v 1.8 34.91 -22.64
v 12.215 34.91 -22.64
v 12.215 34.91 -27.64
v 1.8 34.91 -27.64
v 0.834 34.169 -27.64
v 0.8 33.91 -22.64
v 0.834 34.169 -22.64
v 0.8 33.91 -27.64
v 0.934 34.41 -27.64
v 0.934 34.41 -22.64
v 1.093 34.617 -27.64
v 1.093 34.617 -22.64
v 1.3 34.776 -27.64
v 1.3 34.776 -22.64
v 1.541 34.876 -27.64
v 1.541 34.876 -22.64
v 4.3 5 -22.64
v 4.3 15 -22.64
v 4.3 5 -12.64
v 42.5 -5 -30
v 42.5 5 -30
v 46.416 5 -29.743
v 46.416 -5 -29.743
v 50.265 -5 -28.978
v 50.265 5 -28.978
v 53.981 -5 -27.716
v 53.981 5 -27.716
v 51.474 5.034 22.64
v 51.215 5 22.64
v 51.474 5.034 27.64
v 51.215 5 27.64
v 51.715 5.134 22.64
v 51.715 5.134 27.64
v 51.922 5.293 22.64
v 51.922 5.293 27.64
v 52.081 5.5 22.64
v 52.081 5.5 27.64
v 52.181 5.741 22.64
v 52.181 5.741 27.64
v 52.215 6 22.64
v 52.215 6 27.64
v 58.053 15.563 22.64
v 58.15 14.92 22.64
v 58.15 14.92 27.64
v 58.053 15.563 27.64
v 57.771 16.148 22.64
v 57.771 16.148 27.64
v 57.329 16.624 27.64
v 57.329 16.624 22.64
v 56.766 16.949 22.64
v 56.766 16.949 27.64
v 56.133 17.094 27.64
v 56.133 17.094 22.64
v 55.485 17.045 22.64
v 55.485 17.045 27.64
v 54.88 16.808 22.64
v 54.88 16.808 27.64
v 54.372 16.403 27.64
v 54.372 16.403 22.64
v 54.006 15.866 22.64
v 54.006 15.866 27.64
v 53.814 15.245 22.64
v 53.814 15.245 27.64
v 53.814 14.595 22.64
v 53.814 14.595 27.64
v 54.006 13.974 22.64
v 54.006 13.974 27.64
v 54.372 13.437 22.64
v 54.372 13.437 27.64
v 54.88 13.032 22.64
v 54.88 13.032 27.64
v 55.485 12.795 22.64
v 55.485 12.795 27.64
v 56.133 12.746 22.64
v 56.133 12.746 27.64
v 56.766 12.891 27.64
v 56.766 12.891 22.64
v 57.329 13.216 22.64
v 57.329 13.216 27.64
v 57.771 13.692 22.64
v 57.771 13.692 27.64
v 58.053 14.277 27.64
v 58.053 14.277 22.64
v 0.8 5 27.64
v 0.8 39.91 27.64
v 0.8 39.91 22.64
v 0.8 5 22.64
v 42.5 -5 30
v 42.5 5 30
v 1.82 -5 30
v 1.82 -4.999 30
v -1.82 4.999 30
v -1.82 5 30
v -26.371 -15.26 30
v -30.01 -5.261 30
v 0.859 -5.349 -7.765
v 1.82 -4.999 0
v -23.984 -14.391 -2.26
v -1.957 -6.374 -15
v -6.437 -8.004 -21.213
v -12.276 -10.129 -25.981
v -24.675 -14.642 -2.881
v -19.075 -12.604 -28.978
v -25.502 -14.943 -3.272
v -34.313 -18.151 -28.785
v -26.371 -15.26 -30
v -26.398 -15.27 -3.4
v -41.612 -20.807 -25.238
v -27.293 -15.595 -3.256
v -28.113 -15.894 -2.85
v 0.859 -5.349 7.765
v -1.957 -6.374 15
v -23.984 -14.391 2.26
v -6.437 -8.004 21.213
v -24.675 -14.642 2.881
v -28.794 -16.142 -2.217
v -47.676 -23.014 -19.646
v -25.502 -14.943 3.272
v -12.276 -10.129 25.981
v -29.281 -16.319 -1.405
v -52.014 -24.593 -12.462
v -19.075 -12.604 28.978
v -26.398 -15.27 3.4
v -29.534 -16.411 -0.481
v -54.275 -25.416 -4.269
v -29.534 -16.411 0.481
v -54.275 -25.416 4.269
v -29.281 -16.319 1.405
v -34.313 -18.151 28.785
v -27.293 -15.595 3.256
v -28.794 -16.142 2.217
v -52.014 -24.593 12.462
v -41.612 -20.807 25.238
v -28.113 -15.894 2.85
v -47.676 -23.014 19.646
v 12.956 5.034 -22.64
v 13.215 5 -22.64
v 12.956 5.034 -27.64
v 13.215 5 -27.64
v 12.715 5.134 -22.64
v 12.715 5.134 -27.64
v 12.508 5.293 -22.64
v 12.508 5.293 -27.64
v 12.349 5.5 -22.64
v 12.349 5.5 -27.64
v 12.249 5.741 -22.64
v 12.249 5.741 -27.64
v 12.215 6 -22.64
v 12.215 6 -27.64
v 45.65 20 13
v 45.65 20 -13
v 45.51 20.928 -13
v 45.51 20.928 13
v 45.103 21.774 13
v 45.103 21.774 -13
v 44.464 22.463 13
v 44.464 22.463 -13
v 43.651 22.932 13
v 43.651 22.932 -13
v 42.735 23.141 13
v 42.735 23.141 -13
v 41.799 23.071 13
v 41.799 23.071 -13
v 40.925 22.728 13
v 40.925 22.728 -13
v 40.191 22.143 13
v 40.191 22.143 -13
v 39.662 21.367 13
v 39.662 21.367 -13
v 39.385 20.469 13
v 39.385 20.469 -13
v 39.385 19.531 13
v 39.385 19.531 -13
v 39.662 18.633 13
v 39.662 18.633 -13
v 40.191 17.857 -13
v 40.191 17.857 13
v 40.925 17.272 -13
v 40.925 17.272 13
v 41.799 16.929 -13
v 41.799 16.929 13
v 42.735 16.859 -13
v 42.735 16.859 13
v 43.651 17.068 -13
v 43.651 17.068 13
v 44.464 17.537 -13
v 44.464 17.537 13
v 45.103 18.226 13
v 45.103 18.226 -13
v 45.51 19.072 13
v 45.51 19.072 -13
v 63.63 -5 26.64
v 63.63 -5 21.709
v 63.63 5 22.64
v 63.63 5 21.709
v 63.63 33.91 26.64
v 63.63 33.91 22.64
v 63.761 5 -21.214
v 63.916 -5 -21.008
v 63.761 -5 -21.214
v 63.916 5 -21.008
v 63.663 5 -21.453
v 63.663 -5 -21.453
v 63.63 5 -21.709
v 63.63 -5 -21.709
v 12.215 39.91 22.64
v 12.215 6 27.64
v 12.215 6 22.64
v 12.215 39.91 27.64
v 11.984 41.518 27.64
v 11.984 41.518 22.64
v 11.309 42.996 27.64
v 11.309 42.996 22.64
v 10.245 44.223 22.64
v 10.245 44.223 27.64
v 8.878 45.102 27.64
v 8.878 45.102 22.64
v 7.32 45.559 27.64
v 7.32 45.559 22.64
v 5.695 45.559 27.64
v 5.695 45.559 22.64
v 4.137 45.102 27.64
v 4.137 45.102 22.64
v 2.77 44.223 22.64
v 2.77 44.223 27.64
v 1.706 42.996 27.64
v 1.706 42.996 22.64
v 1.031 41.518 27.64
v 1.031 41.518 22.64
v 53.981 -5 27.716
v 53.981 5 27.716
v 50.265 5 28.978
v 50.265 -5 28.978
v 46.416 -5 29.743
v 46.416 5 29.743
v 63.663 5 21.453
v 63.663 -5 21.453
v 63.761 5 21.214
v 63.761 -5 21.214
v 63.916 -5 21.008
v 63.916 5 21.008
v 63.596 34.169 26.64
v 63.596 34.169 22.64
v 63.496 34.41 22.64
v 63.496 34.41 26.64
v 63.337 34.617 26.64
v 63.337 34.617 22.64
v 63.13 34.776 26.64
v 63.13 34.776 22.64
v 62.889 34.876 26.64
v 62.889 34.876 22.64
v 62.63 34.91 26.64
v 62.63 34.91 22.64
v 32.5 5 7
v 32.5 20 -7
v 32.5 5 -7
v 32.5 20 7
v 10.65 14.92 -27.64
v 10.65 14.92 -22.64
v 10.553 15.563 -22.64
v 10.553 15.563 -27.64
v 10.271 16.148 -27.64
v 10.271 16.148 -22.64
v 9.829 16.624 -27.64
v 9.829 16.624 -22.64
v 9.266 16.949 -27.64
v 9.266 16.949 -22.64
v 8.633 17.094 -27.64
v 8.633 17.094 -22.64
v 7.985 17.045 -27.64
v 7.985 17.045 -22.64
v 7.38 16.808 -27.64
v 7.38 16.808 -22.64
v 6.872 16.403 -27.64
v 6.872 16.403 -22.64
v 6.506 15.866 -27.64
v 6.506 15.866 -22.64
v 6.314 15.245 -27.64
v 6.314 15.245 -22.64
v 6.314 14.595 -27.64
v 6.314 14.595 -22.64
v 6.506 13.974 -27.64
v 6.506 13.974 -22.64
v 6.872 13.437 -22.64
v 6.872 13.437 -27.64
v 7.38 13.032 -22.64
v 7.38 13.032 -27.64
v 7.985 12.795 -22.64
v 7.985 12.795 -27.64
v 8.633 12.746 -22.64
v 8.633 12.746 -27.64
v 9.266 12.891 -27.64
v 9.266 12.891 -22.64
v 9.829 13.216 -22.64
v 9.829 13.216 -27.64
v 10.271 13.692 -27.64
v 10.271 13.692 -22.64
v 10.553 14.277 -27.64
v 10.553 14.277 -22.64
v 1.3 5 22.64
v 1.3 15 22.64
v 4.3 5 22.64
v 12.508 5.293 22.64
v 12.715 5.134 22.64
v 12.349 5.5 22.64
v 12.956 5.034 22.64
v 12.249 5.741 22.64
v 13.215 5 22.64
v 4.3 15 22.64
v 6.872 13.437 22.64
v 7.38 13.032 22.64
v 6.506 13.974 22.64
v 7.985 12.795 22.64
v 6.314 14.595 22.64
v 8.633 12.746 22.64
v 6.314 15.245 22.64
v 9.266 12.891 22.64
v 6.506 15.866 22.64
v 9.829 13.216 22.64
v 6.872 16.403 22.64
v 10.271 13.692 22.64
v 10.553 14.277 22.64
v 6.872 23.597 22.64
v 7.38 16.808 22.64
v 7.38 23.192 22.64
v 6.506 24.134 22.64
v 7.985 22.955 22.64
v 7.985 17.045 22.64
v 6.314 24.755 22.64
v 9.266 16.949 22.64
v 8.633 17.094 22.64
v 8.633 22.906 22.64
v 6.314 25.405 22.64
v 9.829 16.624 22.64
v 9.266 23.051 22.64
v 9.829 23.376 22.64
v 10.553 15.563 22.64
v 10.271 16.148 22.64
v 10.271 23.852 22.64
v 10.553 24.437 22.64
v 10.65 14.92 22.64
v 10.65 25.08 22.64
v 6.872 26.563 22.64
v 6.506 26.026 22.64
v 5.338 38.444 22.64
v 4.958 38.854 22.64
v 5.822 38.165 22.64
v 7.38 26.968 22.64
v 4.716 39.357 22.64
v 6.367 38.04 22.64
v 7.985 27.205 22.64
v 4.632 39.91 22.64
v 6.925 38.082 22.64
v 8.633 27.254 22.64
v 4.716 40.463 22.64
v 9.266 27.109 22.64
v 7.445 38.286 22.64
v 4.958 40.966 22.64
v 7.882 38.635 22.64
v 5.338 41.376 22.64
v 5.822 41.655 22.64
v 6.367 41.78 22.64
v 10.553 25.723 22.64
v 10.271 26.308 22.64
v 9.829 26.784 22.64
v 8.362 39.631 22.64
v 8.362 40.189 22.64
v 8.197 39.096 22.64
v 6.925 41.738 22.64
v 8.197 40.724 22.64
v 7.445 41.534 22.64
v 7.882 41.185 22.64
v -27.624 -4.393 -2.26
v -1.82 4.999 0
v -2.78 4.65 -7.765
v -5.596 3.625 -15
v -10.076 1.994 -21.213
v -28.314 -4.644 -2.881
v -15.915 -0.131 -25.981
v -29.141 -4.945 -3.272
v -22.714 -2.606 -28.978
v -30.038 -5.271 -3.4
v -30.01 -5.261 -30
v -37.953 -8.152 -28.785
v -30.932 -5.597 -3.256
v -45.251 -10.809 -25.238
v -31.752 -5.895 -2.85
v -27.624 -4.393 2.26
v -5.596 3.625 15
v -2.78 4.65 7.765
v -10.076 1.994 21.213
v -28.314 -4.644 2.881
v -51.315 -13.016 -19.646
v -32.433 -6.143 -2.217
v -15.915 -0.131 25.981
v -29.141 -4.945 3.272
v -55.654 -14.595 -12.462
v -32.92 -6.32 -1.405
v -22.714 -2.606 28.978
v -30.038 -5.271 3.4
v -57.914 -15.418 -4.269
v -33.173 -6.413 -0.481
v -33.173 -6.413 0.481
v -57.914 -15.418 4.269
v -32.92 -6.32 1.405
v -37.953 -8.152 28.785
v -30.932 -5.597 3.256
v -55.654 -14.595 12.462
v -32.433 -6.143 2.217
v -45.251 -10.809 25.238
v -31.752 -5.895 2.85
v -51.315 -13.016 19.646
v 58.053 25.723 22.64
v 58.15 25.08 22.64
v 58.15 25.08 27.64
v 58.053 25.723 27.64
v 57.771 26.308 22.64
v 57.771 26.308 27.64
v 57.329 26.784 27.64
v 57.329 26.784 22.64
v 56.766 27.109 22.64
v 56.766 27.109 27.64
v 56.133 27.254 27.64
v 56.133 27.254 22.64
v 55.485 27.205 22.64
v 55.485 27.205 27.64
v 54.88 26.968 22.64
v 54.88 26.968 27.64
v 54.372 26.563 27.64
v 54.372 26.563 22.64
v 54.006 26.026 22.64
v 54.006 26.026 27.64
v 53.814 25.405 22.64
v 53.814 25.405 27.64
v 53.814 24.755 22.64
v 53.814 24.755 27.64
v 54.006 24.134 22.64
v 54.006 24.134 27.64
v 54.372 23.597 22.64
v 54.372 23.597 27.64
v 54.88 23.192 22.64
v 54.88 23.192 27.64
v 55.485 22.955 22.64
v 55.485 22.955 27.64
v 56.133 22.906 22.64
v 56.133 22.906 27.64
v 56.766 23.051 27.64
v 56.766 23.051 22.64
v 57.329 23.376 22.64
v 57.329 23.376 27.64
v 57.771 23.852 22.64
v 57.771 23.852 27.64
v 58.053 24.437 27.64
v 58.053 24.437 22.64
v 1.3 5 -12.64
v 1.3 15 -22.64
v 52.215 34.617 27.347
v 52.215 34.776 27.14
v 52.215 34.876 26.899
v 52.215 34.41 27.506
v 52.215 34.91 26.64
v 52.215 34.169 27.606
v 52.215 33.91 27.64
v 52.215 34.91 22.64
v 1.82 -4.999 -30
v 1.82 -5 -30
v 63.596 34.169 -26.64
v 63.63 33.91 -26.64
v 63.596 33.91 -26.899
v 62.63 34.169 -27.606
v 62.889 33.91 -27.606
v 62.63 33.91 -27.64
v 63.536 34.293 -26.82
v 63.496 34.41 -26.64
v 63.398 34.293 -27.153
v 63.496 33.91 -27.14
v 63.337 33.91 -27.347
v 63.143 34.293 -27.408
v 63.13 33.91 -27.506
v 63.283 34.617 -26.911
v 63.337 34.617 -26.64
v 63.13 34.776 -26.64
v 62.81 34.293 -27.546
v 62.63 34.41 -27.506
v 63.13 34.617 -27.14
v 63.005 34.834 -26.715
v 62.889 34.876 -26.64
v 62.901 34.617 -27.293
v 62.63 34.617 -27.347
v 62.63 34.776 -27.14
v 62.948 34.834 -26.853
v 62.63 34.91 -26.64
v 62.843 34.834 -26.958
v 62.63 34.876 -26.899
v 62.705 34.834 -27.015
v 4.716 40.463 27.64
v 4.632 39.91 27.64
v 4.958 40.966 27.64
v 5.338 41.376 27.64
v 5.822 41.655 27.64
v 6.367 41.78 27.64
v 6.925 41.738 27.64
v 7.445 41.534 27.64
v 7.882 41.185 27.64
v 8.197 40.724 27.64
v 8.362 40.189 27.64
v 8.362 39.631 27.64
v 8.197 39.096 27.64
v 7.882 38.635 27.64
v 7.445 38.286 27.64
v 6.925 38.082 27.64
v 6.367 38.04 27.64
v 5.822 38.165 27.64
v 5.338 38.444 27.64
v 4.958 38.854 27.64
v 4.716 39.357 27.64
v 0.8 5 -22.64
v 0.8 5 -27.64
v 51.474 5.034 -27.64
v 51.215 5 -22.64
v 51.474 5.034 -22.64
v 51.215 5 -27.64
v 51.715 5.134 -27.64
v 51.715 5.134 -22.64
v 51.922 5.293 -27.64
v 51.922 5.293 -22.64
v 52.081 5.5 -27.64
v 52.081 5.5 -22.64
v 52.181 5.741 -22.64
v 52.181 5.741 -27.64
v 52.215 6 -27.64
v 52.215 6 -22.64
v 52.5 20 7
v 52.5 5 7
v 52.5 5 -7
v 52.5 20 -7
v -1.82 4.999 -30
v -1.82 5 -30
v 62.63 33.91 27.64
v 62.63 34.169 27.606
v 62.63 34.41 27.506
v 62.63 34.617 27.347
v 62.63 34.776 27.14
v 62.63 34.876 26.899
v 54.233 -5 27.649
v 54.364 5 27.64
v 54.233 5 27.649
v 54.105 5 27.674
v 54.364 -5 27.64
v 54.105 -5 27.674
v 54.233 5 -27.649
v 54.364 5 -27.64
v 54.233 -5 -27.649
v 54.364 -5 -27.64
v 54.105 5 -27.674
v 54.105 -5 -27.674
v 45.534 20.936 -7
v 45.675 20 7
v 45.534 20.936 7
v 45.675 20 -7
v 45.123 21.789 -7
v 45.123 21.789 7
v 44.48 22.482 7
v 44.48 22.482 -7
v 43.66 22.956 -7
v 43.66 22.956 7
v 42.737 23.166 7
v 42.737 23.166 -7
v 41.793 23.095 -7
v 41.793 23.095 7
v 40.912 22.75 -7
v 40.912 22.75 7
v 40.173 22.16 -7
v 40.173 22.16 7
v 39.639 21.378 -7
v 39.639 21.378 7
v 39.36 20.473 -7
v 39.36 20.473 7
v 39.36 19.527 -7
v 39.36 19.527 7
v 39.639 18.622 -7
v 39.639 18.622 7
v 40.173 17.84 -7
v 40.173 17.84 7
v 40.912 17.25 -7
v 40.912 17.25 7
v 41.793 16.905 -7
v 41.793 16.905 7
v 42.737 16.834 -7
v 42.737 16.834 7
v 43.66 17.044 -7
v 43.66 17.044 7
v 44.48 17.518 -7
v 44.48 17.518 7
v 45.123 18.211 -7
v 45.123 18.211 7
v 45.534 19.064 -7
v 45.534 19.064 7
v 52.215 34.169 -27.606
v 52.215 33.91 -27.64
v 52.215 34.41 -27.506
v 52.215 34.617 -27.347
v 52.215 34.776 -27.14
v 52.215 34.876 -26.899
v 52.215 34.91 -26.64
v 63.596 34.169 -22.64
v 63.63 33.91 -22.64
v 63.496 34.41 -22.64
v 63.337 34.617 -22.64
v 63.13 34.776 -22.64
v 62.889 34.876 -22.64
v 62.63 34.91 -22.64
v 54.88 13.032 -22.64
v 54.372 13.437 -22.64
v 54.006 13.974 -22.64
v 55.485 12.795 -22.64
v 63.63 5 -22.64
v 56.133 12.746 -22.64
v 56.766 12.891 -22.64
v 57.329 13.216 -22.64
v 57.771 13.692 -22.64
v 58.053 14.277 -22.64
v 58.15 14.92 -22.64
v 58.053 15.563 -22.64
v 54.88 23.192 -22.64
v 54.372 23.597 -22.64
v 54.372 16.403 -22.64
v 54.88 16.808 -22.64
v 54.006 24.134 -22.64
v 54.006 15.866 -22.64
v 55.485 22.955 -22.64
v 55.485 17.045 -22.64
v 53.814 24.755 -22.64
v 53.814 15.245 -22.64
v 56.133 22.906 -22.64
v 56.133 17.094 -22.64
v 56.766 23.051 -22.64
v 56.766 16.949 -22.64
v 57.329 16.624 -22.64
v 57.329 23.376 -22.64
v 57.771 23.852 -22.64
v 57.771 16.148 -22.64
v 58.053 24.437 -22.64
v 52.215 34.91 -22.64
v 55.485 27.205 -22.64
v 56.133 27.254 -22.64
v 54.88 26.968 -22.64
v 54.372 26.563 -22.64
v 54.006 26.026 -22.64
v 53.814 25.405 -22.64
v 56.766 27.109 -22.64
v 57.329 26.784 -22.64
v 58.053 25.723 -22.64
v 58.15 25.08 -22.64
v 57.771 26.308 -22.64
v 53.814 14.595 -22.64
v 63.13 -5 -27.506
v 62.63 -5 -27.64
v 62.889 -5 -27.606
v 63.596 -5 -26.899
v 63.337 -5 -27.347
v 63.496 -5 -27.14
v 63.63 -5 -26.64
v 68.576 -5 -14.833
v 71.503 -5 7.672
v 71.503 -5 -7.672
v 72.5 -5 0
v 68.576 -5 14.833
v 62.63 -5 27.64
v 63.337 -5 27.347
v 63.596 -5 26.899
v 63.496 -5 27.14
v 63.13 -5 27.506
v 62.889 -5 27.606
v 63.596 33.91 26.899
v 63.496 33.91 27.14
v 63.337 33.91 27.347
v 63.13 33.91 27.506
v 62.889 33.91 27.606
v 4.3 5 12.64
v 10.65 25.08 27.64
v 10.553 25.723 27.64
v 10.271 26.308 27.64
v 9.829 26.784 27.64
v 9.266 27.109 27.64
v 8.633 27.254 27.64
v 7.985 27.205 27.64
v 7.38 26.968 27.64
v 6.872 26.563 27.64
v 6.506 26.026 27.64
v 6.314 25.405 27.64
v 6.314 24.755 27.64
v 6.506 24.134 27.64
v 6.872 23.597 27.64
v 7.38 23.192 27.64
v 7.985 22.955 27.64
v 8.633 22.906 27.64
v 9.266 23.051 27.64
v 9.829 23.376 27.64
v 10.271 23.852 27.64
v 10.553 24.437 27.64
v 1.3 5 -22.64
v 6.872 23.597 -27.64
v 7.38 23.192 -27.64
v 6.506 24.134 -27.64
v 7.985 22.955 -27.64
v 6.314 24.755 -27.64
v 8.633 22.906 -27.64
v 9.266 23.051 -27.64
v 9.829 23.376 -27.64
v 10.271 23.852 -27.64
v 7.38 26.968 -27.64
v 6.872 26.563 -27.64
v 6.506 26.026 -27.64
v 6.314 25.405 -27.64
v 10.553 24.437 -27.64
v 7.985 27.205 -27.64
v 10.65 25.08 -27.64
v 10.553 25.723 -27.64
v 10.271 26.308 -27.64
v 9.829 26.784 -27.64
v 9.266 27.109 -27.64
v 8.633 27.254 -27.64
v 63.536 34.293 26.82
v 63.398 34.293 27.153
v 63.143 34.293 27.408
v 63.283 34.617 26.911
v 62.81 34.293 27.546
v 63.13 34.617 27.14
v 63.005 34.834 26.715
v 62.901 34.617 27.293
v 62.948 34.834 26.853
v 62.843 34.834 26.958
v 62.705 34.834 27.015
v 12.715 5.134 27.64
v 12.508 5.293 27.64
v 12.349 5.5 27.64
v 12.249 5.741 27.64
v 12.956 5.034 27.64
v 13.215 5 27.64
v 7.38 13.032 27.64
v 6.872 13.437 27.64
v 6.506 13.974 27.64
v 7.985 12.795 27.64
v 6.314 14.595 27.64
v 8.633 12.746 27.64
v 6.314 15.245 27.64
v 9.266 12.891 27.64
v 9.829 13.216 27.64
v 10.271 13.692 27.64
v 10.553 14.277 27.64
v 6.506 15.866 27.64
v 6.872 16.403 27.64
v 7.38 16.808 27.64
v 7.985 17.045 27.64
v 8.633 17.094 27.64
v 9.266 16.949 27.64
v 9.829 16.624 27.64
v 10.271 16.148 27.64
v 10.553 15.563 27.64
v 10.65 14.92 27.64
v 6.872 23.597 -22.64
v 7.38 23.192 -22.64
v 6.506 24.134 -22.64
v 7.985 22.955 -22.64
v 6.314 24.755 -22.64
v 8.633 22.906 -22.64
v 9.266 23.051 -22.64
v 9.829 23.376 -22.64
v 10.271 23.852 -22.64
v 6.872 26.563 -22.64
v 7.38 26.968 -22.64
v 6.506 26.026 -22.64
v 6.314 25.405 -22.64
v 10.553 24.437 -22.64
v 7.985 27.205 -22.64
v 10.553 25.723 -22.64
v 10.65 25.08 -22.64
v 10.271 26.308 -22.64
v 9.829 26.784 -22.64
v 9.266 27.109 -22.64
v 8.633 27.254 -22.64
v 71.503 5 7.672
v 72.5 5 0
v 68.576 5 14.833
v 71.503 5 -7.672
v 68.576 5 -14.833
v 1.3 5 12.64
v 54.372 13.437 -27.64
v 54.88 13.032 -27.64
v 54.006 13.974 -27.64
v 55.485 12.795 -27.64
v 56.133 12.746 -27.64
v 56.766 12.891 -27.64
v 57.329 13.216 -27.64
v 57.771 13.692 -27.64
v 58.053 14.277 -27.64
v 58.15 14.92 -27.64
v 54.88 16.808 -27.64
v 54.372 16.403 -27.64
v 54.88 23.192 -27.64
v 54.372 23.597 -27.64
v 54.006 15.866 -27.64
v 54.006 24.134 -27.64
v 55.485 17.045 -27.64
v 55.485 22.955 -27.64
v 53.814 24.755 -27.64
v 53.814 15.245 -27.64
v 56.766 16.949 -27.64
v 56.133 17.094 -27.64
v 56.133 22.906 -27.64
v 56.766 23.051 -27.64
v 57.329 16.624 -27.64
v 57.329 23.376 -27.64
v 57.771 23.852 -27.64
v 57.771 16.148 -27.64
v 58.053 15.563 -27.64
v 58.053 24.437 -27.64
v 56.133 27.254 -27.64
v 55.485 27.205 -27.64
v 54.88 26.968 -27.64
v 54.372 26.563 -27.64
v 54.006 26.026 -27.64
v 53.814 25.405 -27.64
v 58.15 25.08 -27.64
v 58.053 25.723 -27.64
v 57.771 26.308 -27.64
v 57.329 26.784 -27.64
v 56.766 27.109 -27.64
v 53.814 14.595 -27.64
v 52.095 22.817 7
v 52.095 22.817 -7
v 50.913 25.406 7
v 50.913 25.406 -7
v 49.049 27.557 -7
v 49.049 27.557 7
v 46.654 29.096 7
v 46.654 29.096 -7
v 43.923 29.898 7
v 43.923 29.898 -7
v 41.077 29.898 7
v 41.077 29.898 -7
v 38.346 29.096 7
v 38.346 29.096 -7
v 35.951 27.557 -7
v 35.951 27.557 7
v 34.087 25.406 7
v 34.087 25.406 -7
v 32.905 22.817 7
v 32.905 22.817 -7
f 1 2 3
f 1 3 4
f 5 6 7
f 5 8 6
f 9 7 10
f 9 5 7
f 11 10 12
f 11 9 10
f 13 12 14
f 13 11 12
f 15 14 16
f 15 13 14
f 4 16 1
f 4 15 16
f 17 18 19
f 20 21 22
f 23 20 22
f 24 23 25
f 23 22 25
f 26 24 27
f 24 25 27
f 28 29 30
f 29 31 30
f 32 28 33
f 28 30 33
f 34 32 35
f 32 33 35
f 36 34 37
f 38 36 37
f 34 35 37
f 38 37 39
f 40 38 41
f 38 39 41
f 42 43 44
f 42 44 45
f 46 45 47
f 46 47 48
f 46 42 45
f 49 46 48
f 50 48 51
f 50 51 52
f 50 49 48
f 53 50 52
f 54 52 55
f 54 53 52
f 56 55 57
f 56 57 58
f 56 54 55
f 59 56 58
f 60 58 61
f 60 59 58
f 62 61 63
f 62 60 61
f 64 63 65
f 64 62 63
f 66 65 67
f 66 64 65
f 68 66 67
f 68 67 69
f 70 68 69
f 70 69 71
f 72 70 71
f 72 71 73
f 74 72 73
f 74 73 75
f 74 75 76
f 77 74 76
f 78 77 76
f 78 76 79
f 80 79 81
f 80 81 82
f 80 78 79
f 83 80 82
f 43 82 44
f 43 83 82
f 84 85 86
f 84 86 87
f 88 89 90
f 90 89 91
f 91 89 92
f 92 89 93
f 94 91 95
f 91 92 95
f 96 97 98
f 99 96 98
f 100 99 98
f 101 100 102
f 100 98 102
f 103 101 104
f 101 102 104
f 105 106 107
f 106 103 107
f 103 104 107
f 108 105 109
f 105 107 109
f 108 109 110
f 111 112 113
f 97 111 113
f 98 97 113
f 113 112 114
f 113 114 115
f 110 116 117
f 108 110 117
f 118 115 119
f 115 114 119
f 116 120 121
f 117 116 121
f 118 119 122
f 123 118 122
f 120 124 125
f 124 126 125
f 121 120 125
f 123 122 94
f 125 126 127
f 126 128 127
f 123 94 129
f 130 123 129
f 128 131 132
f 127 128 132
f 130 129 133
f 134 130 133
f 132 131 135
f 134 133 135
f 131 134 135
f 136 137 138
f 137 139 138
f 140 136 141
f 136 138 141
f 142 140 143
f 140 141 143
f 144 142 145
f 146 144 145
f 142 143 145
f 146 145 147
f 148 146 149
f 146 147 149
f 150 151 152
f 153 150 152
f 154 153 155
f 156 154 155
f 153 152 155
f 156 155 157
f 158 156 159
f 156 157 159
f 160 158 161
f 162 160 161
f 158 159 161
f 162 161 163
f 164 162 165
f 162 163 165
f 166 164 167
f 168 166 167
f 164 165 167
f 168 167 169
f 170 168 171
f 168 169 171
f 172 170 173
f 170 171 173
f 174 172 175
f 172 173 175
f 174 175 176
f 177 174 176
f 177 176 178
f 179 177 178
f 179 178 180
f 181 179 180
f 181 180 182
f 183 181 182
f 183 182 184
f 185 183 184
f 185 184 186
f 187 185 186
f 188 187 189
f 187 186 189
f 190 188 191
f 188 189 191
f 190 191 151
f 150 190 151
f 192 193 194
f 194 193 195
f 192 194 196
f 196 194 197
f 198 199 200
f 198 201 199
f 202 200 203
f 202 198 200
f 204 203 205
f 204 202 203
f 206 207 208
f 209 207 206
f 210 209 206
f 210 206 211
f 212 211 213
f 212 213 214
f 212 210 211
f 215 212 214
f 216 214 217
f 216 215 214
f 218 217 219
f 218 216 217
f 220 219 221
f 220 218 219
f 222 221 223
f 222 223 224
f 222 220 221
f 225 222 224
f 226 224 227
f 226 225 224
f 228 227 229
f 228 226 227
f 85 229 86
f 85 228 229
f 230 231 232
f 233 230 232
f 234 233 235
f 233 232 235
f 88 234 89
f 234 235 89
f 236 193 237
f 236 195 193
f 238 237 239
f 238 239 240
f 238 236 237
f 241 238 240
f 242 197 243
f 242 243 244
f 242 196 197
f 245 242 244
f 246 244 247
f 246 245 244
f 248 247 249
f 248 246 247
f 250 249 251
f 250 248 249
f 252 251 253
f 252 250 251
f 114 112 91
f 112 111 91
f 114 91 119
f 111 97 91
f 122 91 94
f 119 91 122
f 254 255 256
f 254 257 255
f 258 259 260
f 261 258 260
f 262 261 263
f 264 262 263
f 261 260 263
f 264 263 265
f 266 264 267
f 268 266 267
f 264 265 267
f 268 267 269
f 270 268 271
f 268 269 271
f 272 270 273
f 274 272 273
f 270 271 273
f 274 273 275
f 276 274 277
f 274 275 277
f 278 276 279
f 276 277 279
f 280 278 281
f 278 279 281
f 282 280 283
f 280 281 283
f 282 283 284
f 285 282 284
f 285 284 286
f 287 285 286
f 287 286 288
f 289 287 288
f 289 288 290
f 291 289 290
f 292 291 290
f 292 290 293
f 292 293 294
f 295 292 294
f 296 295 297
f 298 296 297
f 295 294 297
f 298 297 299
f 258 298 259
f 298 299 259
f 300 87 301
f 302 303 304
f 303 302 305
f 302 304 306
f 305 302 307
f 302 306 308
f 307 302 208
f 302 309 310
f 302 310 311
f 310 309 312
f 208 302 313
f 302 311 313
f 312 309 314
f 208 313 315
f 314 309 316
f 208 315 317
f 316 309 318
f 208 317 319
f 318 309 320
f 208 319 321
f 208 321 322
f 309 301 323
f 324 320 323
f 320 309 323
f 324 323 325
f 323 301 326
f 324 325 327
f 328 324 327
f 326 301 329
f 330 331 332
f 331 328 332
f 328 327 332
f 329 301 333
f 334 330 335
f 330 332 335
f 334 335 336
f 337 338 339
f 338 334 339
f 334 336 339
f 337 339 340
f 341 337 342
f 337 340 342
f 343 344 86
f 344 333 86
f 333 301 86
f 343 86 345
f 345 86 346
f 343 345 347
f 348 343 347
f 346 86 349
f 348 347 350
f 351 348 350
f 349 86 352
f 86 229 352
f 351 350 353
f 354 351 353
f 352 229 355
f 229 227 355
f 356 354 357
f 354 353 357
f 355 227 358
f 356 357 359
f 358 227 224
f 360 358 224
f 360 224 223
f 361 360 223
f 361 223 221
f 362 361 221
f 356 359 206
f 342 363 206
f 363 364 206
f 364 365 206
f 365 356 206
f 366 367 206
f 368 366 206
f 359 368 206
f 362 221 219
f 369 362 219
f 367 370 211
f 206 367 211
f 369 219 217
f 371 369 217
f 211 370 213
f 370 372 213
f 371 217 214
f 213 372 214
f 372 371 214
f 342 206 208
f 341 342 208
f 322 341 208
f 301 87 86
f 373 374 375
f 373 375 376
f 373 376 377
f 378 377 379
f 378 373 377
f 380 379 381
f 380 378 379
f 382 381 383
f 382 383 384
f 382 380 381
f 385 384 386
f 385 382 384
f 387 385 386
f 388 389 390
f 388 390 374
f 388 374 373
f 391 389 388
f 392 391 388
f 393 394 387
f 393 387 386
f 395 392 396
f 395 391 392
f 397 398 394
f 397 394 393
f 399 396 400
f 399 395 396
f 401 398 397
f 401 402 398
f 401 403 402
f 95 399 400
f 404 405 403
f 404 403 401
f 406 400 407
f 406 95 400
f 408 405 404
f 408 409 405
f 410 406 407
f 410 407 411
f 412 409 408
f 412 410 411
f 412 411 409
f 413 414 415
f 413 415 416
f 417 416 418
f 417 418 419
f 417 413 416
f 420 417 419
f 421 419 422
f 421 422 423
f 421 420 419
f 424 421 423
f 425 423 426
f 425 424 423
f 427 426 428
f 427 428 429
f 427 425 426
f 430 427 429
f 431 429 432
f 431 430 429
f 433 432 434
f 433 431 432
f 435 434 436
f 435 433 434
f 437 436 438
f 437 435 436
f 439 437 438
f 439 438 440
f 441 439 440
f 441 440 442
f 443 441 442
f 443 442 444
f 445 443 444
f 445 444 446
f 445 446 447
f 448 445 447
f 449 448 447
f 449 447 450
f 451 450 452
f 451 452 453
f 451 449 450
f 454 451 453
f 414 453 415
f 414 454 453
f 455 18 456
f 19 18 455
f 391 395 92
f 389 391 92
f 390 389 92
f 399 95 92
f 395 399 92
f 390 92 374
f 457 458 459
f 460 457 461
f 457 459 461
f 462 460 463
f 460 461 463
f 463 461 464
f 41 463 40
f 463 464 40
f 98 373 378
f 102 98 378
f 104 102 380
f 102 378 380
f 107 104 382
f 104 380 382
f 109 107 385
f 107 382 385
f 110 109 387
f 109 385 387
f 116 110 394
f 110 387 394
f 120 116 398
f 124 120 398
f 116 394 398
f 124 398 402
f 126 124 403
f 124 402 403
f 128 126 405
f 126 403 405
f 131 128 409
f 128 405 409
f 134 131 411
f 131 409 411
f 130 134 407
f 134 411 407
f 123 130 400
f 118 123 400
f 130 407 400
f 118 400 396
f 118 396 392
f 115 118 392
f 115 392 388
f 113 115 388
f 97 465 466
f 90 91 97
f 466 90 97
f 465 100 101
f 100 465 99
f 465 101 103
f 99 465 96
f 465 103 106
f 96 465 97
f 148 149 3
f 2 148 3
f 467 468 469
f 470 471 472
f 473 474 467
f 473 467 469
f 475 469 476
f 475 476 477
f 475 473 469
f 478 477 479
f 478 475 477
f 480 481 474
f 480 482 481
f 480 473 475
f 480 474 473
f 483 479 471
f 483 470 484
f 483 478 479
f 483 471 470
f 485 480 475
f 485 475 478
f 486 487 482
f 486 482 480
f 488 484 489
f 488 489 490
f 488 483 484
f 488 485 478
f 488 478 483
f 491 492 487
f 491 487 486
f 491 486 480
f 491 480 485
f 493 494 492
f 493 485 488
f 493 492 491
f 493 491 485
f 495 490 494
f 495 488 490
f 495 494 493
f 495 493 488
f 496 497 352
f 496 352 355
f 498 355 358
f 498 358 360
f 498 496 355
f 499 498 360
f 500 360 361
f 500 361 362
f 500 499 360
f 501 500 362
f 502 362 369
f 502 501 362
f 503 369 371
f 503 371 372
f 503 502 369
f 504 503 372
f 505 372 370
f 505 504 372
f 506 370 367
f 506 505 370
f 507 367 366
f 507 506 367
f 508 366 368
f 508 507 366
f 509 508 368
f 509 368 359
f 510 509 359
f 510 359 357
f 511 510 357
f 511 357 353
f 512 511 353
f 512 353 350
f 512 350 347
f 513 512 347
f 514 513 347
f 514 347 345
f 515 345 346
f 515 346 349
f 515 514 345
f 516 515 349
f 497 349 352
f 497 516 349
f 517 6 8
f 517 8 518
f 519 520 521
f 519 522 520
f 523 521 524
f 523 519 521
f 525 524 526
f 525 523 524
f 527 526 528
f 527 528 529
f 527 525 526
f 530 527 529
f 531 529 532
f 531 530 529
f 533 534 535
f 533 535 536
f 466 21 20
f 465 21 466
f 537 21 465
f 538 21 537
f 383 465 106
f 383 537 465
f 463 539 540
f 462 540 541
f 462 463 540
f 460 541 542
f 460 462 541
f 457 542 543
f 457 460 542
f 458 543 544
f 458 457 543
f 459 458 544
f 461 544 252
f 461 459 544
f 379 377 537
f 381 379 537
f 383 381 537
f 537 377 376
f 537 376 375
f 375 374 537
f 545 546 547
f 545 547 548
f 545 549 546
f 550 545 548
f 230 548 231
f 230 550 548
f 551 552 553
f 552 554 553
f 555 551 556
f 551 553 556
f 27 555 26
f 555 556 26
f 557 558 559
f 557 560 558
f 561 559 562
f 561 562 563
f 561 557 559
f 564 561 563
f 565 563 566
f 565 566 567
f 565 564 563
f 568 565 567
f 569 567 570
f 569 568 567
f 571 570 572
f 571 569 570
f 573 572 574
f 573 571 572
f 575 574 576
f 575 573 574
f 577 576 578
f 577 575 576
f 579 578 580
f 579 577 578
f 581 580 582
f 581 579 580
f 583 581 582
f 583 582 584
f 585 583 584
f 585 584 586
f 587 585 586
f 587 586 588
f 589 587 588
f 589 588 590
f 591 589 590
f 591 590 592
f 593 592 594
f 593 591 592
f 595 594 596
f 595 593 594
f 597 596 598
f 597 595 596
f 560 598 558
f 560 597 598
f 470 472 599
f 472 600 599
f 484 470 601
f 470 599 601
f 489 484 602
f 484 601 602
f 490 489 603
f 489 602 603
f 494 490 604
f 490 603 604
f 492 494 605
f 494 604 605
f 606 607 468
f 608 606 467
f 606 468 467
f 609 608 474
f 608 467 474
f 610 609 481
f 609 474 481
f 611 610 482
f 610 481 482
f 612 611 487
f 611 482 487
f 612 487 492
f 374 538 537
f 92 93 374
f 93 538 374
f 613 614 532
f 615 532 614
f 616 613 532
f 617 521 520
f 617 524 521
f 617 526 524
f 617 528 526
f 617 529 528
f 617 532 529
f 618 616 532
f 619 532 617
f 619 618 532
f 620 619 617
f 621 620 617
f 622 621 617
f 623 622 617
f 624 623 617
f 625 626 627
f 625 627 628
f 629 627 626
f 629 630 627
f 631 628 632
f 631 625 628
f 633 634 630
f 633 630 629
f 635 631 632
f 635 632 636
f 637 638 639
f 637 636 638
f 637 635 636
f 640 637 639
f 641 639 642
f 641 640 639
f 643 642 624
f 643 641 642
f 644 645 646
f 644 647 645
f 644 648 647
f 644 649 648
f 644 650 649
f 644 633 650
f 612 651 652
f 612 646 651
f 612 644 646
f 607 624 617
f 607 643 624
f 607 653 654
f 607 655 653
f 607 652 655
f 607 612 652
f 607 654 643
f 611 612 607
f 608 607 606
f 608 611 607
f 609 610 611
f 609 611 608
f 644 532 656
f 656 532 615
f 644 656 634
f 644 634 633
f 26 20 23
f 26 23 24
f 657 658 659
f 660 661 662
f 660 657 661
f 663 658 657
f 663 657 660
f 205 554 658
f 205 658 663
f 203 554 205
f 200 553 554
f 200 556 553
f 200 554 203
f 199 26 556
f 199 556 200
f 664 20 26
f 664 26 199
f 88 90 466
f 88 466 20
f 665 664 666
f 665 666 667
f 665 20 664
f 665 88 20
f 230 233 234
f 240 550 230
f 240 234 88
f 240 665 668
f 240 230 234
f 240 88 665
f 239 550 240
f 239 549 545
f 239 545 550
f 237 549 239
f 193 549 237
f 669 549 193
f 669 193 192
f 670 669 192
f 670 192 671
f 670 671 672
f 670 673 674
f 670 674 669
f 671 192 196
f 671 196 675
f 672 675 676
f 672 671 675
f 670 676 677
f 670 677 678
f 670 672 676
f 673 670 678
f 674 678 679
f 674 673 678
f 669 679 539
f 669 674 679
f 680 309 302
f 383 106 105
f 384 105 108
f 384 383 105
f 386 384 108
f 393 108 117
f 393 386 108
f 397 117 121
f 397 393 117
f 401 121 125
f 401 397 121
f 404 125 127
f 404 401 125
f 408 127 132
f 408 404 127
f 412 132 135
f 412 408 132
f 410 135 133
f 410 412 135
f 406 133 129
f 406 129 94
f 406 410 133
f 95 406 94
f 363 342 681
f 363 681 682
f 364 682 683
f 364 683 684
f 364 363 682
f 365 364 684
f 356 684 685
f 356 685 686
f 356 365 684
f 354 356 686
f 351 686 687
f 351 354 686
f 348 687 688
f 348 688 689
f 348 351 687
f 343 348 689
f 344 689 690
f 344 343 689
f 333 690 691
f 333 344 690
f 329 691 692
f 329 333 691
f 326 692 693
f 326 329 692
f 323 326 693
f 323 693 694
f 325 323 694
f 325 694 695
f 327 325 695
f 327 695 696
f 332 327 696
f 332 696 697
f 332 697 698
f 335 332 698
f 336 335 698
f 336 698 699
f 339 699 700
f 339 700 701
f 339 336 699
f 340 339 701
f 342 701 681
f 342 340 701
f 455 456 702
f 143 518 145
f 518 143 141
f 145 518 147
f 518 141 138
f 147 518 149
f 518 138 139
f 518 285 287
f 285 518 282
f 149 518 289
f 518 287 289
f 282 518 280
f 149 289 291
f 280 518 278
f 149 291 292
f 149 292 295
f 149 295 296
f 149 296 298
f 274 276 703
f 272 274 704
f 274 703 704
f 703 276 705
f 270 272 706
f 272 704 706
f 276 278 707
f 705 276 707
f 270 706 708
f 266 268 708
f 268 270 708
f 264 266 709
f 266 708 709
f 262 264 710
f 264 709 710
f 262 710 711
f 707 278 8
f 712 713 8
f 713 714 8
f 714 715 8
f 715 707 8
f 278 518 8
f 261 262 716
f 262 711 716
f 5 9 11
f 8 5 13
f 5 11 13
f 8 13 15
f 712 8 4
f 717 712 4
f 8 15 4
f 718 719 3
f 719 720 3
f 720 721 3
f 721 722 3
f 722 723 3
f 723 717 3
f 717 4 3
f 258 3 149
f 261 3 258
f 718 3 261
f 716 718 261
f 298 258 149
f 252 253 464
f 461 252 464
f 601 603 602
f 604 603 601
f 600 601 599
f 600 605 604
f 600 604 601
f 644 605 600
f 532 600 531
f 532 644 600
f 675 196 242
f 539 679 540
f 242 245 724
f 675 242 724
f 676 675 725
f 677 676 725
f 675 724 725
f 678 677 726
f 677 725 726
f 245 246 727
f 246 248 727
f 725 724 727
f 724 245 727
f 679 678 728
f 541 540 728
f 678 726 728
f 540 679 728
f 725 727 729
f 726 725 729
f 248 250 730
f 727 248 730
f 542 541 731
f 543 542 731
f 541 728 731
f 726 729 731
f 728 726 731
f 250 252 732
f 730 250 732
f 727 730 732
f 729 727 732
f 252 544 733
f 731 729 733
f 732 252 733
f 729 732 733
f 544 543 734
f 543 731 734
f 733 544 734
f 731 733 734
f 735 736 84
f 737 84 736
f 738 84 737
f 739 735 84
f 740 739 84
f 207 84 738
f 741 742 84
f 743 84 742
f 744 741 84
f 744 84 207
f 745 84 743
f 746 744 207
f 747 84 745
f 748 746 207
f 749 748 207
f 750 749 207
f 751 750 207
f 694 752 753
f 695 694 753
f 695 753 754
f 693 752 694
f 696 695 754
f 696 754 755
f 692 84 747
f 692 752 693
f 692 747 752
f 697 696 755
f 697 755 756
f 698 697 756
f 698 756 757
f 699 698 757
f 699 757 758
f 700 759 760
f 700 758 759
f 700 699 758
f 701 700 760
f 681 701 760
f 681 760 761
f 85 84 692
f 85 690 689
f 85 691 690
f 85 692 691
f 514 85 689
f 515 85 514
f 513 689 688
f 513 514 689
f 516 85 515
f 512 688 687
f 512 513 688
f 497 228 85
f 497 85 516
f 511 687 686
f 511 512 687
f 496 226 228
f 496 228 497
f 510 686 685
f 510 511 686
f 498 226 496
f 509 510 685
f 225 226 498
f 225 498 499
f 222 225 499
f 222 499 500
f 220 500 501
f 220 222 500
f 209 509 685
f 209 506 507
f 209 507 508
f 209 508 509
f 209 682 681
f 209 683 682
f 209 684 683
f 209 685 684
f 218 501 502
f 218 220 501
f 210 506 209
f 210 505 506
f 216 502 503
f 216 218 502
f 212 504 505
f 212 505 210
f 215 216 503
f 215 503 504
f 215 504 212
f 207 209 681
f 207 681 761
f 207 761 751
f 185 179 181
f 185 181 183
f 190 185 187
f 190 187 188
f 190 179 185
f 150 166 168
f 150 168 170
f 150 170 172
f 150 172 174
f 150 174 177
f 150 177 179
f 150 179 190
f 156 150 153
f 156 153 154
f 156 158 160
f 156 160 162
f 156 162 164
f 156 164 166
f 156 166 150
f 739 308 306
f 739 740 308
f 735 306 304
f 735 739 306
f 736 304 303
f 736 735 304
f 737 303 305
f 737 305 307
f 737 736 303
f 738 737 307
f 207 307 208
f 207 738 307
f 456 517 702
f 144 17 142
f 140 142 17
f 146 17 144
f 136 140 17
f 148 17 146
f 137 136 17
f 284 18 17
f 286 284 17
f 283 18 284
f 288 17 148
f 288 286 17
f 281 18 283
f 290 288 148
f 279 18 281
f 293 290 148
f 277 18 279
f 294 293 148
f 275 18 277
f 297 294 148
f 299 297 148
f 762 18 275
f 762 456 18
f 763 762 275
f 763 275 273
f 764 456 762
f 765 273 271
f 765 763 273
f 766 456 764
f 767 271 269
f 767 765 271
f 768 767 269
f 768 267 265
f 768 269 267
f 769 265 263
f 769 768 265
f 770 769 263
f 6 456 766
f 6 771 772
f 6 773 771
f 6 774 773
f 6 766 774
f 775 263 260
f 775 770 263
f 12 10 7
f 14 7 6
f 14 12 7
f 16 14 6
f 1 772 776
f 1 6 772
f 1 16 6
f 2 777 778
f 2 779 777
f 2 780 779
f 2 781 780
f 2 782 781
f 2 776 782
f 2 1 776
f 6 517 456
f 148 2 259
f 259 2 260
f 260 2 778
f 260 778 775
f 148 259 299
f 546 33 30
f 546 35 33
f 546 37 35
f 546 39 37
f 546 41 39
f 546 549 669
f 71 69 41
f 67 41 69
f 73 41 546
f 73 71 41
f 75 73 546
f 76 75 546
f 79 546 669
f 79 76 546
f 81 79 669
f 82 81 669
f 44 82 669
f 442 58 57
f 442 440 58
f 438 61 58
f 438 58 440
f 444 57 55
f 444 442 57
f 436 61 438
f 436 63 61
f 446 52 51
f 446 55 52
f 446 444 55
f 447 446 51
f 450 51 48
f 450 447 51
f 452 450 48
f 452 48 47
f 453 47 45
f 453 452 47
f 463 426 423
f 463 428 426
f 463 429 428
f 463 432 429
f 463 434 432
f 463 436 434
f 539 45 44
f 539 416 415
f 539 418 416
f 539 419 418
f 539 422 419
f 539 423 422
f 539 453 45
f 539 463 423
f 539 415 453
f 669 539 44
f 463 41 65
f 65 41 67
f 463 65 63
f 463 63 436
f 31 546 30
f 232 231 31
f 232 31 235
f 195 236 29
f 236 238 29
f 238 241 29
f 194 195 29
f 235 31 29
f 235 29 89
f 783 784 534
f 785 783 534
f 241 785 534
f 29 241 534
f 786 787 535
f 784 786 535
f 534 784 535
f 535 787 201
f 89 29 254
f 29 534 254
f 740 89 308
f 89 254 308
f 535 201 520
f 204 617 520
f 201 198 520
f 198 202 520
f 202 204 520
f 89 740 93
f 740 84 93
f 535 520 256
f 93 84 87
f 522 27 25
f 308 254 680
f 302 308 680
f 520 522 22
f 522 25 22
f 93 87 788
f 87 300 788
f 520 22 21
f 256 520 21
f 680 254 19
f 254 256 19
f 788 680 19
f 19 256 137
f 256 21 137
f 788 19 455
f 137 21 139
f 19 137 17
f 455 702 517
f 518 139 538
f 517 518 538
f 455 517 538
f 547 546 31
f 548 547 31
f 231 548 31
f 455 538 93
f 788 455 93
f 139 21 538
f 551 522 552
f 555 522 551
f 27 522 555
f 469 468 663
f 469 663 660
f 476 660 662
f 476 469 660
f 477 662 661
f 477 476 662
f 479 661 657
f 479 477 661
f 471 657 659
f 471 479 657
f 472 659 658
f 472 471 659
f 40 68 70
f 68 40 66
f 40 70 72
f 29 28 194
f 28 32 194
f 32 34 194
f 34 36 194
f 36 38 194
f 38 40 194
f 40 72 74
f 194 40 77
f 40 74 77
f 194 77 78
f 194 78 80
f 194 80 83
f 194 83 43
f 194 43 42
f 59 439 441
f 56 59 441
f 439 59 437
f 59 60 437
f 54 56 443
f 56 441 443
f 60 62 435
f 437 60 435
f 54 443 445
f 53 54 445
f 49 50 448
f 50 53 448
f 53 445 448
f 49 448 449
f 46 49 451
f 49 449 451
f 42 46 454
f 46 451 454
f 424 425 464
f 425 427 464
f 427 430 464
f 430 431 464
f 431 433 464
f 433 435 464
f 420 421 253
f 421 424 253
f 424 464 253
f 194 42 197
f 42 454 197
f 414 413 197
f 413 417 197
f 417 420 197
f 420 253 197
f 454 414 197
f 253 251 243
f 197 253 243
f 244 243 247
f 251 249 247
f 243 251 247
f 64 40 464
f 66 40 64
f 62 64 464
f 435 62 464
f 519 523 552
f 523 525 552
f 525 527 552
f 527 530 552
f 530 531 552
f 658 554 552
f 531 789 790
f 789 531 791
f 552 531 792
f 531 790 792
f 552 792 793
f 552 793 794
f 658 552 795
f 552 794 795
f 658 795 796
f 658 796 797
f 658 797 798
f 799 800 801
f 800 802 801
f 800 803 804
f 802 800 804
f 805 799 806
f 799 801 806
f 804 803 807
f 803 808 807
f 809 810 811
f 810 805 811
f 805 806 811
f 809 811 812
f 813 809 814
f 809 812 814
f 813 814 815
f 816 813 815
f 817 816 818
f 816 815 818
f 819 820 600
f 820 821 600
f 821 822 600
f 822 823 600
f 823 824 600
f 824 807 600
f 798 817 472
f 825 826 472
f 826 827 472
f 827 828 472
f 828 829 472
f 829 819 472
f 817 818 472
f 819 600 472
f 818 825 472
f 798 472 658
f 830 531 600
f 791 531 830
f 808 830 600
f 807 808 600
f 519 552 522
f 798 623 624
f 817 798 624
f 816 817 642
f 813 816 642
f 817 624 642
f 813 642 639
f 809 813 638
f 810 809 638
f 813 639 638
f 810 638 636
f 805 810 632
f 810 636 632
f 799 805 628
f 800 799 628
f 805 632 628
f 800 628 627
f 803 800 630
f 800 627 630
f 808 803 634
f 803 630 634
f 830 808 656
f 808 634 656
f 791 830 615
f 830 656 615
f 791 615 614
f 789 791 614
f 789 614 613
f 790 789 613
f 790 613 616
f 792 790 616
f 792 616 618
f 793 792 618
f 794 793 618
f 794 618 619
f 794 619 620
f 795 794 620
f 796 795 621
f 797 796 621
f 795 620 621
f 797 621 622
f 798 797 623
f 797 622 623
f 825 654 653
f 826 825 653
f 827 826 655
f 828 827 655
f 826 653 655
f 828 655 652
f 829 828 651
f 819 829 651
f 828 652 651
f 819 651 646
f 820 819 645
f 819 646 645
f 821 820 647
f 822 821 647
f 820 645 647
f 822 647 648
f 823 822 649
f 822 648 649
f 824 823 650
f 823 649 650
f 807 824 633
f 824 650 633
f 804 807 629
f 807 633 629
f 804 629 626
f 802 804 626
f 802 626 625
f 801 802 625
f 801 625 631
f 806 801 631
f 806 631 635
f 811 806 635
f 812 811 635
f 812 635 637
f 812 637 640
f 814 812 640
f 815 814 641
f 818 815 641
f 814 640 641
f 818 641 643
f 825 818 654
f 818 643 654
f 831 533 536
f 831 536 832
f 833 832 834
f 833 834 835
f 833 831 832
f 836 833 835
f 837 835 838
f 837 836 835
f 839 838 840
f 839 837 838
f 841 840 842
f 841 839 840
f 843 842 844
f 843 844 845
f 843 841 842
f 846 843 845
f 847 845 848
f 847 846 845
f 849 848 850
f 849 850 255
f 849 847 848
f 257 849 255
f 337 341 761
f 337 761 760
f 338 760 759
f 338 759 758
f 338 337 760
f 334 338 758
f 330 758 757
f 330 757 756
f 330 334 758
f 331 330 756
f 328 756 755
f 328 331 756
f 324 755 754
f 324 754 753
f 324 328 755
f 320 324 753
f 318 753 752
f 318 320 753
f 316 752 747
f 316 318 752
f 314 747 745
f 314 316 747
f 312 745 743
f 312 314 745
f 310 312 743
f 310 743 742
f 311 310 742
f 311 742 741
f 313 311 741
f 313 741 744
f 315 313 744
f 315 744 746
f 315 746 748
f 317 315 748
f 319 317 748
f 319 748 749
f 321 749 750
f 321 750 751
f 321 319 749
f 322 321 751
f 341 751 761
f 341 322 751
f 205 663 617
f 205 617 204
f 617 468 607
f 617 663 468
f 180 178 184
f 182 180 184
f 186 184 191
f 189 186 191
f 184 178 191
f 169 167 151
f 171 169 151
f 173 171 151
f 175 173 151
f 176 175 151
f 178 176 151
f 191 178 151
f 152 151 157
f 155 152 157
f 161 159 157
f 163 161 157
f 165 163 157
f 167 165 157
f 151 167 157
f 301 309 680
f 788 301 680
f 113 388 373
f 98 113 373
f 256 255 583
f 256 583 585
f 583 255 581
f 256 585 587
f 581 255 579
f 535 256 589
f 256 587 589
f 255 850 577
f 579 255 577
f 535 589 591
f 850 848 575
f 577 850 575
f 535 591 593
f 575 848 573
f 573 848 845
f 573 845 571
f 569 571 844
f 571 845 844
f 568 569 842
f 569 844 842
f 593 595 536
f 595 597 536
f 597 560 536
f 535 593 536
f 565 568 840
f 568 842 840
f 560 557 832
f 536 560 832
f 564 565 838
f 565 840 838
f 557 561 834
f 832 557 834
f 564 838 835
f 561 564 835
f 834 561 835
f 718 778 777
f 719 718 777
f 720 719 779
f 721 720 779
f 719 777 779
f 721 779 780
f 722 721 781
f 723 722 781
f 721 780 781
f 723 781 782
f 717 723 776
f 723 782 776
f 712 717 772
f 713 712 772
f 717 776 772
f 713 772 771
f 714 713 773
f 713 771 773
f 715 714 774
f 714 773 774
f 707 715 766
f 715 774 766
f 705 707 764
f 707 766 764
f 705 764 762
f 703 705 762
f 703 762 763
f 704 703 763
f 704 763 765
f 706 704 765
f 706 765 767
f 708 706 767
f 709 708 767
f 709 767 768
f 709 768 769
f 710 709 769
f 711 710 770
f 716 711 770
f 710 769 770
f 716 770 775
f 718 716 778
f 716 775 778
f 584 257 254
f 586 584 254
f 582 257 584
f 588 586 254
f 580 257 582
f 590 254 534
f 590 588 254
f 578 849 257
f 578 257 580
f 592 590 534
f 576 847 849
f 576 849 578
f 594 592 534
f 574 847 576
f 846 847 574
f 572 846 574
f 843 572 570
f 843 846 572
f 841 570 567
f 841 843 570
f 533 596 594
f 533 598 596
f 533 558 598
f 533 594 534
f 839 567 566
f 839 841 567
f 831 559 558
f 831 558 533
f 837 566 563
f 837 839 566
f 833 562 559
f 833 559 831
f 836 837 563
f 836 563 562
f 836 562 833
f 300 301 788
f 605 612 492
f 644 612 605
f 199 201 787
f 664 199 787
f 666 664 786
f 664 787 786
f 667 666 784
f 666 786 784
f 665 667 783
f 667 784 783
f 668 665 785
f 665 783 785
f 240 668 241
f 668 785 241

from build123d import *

# Parameters (mm, degrees)
BOSS_EXTRU_3_DEPTH       = 5
ESQUISSE7_R              = 3.175
BOSS_EXTRU_5_DEPTH       = 7
ESQUISSE13_R             = 2.18
BOSS_EXTRU_8_DEPTH       = 5
ENL_V_MAT_EXTRU_8_REACH  = 100.981
ESQUISSE47_W             = 40
ESQUISSE47_H             = 5
ESQUISSE33_W             = 9.466792894
ESQUISSE33_H             = 55.28
BOSS_EXTRU_10_DEPTH      = 10
ENL_V_MAT_EXTRU_6_DEPTH  = 65
ESQUISSE35_R             = 30
BOSS_EXTRU_11_DEPTH      = 5.32
BOSS_EXTRU_12_DEPTH      = 30
ENL_V_MAT_EXTRU_7_DEPTH  = 60
BOSS_EXTRU_13_DEPTH      = 5
NERVURE4_REACH           = 90.538
ESQUISSE45_WALL_W        = 193.218913386
ESQUISSE45_WALL_H        = 3
CONG_1_R                 = 1
CONG_2_R                 = 1
BOSS_EXTRU_14_DEPTH      = 13
BOSS_EXTRU_14_DEPTH_BACK = 13
ESQUISSE48_R             = 3.15


with BuildPart() as part:
    # Esquisse5 → Boss.-Extru.3 (new, symmetric)
    with BuildSketch(Plane(origin=(0, 0, 0), x_dir=(1, 0, 0), z_dir=(0, 1, 0))):
        with BuildLine():
            Line((42.5, -30), (-42.5, -30))
            ThreePointArc((-42.5, -30), (-72.5, 0), (-42.5, 30))
            Line((-42.5, 30), (42.5, 30))
            ThreePointArc((42.5, 30), (72.5, 0), (42.5, -30))
        make_face()
    extrude(amount=BOSS_EXTRU_3_DEPTH, both=True)

    # Esquisse7 → Boss.-Extru.5 (add, symmetric)
    with BuildSketch(Plane.XY):
        with BuildLine():
            Line((32.5, 5), (52.5, 5))
            Line((52.5, 5), (52.5, 20))
            ThreePointArc((52.5, 20), (42.5, 30), (32.5, 20))
            Line((32.5, 20), (32.5, 5))
        make_face()
        with Locations((42.5, 20)):
            Circle(ESQUISSE7_R, mode=Mode.SUBTRACT)
    extrude(amount=BOSS_EXTRU_5_DEPTH, both=True)

    # Esquisse13 → Boss.-Extru.8 (add)
    with BuildSketch(Plane.XY.offset(22.64)):
        Polygon((0.8, 5), (5.8, 5), (12.215, 5), (12.215, 29.91), (52.215, 29.91), (52.215, 5), (58.63, 5), (63.63, 5), (63.63, 34.91), (0.8, 34.91), align=None)
        with Locations((8.47, 14.92)):
            Circle(ESQUISSE13_R, mode=Mode.SUBTRACT)
        with Locations((55.97, 14.92)):
            Circle(ESQUISSE13_R, mode=Mode.SUBTRACT)
        with Locations((8.47, 25.08)):
            Circle(ESQUISSE13_R, mode=Mode.SUBTRACT)
        with Locations((55.97, 25.08)):
            Circle(ESQUISSE13_R, mode=Mode.SUBTRACT)
    boss_extru_8 = extrude(amount=BOSS_EXTRU_8_DEPTH)

    # Esquisse47 → Enlèv. mat.-Extru.8 (cut, up to next)
    with BuildSketch(Plane.XY.offset(27.64), mode=Mode.PRIVATE) as enl_v_mat_extru_8_sk1:
        with Locations((32.215, 32.41)):
            Rectangle(ESQUISSE47_W, ESQUISSE47_H)
    enl_v_mat_extru_8_tool1 = extrude(enl_v_mat_extru_8_sk1.sketch, amount=-ENL_V_MAT_EXTRU_8_REACH, mode=Mode.PRIVATE) & part.part
    enl_v_mat_extru_8 = enl_v_mat_extru_8_tool1.solids().sort_by_distance((32.215, 32.41, 27.64))[0]
    add(enl_v_mat_extru_8, mode=Mode.SUBTRACT)

    # Symétrie2: Boss.-Extru.8, Enlèv. mat.-Extru.8 across plane
    add(boss_extru_8.mirror(Plane.XY))
    add(enl_v_mat_extru_8.mirror(Plane.XY), mode=Mode.SUBTRACT)

    # Esquisse33 → Boss.-Extru.10 (add)
    with BuildSketch(Plane.XZ.offset(-5)):
        with Locations((58.896603553, 0)):
            Rectangle(ESQUISSE33_W, ESQUISSE33_H)
    extrude(amount=BOSS_EXTRU_10_DEPTH)

    # Esquisse36 → Enlèv. mat.-Extru.6 (cut, symmetric)
    with BuildSketch(Plane.XY):
        Polygon((0, 0), (9.099255857, -25), (-112.5, -25), (-112.5, 35), (-12.738958199, 35), align=None)
    extrude(amount=ENL_V_MAT_EXTRU_6_DEPTH, both=True, mode=Mode.SUBTRACT)



with BuildPart() as body_2:
    # Esquisse35 → Boss.-Extru.11 (new, symmetric)
    with BuildSketch(Plane(origin=(0, 0, 0), x_dir=(0, 0, -1), z_dir=(-0.34202014332566977, 0.939692620785908, 0))):
        with Locations(Location((0, 30, 0), (0, 0, 90))):
            Circle(ESQUISSE35_R)
    extrude(amount=BOSS_EXTRU_11_DEPTH, both=True)


with BuildPart() as part_1:
    add(part.part)

    add(body_2.part)  # Boss.-Extru.12 merges body 2
    # Esquisse40 → Boss.-Extru.12 (add, symmetric)
    with BuildSketch(Plane.XY):
        Polygon((-26.371231461, -15.259769042), (-30.010325786, -5.261439557), (-1.819547162, 4.999164743), (1.819547162, -4.999164743), align=None)
    extrude(amount=BOSS_EXTRU_12_DEPTH, both=True)

    # Esquisse41 → Enlèv. mat.-Extru.7 (cut)
    with BuildSketch(Plane(origin=(-1.819547162, 4.999164743, 0), x_dir=(0.939692620785908, 0.3420201433256698, 0), z_dir=(-0.3420201433256698, 0.9396926207859081, 0))):
        with BuildLine():
            Line((-27.46, -2.260176984), (-27.46, 2.260176984))
            ThreePointArc((-27.46, 2.260176984), (-33.4, 0), (-27.46, -2.260176984))
        make_face()
    extrude(amount=-ENL_V_MAT_EXTRU_7_DEPTH, mode=Mode.SUBTRACT)

    # Esquisse42 → Boss.-Extru.13 (add)
    with BuildSketch(Plane.XY.offset(27.64)):
        with BuildLine():
            Line((0.8, 39.91), (0.8, 34.91))
            Line((0.8, 34.91), (12.215, 34.91))
            Line((12.215, 34.91), (12.215, 39.91))
            Line((12.215, 39.91), (8.3825, 39.91))
            ThreePointArc((8.3825, 39.91), (6.5075, 38.035), (4.6325, 39.91))
            Line((4.6325, 39.91), (0.8, 39.91))
        make_face()
        with BuildLine():
            ThreePointArc((12.215, 39.91), (6.5075, 45.6175), (0.8, 39.91))
            Line((0.8, 39.91), (4.6325, 39.91))
            ThreePointArc((4.6325, 39.91), (6.5075, 41.785), (8.3825, 39.91))
            Line((8.3825, 39.91), (12.215, 39.91))
        make_face()
    extrude(amount=-BOSS_EXTRU_13_DEPTH)

    # Esquisse45 wall → Nervure4 (add, up to next)
    with BuildSketch(Plane(origin=(2.8, 9.999582371, 17.640000004), x_dir=(0, -0.707106781505, -0.707106780868), z_dir=(0, -0.707106780868, 0.707106781505)), mode=Mode.PRIVATE) as nervure4_sk1:
        Rectangle(ESQUISSE45_WALL_W, ESQUISSE45_WALL_H)
    nervure4_tool1 = extrude(nervure4_sk1.sketch, amount=NERVURE4_REACH, mode=Mode.PRIVATE) - part_1.part
    nervure4 = nervure4_tool1.solids().sort_by_distance((2.8, 9.999582371, 17.640000004))[0]
    add(nervure4)

    # Congé1
    cong_1_edges = [part_1.edges().sort_by_distance(p)[0] for p in [
        (54.163207106, 0, 27.64),
        (63.63, 14.955, -27.64),
        (54.163207106, 0, -27.64),
        (63.63, 14.955, 27.64),
        (63.63, 0, 21.296081799),
        (63.63, 0, -21.296081799),
    ]]
    fillet(cong_1_edges, radius=CONG_1_R)

    # Symétrie3: Nervure4 across plane
    add(nervure4.mirror(Plane.XY))

    # Congé2
    cong_2_edges = [part_1.edges().sort_by_distance(p)[0] for p in [
        (63.63, 34.91, 24.64),
        (63.337106781, 34.91, 27.347106781),
        (63.63, 34.91, -24.64),
        (63.337106781, 34.91, -27.347106781),
        (0.8, 34.91, -25.14),
        (52.215, 5, 25.14),
        (12.215, 5, -25.14),
        (57.4225, 34.91, 27.64),
        (12.215, 5, 25.14),
        (52.215, 5, -25.14),
    ]]
    fillet(cong_2_edges, radius=CONG_2_R)


with BuildPart() as body_2_2:
    # Esquisse48 → Boss.-Extru.14 (new, two sides: drawn at the far end of the back side and taken through both)
    with BuildSketch(Plane.XY.offset(-BOSS_EXTRU_14_DEPTH_BACK)):
        with Locations((42.5, 20)):
            Circle(ESQUISSE48_R)
    extrude(amount=BOSS_EXTRU_14_DEPTH + BOSS_EXTRU_14_DEPTH_BACK)


solid = Compound([part_1.part, body_2_2.part])
